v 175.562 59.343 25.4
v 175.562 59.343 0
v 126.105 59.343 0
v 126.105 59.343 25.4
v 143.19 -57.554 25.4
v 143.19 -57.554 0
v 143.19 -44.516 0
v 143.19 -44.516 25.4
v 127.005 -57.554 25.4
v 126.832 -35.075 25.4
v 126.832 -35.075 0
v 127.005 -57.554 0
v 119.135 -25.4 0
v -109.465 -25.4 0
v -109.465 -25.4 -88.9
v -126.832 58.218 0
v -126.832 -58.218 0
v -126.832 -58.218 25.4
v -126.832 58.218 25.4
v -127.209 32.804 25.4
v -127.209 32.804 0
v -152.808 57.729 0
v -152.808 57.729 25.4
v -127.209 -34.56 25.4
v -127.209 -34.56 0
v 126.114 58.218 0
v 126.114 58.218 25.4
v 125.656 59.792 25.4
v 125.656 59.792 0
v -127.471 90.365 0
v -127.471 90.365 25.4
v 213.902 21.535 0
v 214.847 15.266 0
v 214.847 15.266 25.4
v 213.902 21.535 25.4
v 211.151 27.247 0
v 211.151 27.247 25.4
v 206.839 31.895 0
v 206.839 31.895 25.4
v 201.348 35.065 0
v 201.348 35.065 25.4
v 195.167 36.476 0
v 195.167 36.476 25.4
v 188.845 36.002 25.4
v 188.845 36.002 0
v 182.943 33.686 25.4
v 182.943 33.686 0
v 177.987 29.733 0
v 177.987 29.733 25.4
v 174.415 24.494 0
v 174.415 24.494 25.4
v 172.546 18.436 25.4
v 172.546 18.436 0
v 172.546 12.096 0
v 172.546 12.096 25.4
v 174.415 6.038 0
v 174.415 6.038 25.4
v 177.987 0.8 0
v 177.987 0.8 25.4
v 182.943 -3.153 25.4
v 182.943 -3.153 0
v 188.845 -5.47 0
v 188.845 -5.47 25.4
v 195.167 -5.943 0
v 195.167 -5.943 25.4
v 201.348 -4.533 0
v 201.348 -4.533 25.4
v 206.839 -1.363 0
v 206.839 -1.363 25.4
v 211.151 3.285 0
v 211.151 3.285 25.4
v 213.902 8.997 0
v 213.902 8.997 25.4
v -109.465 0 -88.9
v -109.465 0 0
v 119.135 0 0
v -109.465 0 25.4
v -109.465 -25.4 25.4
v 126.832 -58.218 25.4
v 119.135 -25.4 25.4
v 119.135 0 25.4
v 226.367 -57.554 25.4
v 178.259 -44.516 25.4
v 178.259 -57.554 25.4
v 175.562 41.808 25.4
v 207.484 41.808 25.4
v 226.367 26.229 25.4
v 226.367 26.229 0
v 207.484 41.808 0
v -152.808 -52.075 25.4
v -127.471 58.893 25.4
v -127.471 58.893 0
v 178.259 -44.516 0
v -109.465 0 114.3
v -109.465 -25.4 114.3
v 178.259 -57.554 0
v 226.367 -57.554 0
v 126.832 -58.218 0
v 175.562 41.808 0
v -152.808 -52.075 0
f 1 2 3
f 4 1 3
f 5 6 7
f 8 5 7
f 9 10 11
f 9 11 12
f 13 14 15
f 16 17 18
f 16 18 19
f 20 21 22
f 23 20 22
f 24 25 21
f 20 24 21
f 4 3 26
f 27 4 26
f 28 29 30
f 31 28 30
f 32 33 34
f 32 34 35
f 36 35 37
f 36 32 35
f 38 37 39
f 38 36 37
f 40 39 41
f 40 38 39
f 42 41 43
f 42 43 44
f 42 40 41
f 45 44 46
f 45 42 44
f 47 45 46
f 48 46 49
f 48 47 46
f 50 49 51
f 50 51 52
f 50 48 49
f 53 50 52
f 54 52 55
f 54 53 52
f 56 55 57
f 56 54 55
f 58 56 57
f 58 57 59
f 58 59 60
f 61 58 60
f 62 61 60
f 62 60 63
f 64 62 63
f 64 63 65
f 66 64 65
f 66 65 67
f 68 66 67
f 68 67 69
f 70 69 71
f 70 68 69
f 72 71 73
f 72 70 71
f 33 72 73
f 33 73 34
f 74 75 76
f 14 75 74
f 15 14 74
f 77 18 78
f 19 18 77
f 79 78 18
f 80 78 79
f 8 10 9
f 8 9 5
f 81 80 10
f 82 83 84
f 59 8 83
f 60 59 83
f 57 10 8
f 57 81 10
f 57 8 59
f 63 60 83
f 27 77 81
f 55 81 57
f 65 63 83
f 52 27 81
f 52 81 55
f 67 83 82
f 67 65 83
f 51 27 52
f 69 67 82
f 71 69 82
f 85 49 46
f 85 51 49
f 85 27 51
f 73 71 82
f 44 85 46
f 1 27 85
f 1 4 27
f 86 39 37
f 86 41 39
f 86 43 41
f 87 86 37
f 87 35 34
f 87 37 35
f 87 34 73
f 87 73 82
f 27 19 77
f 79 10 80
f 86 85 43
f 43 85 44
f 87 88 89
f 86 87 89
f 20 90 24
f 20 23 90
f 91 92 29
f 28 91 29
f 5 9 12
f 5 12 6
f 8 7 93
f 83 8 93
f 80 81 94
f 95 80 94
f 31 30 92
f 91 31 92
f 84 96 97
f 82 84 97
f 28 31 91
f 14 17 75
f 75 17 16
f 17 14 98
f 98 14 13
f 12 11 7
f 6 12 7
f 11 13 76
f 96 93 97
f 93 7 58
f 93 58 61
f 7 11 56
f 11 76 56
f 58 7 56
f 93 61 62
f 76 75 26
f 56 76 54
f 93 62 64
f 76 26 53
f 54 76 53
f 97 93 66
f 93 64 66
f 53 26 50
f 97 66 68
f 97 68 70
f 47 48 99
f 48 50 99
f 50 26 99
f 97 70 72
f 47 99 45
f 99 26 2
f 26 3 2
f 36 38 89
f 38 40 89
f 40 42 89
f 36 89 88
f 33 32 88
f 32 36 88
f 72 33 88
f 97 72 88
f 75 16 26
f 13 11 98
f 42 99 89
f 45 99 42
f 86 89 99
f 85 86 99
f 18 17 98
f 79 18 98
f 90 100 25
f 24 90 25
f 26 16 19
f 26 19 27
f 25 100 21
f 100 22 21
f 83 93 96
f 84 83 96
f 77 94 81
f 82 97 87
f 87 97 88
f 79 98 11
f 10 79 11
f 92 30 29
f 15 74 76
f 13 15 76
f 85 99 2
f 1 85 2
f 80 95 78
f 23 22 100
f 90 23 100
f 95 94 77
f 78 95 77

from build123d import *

# Parameters (mm, degrees)
F0_W     = 253.6633908749
F0_H     = 116.4356470108
F5_DEPTH = 25.4
F8_DEPTH = 25.4
F1_R     = 21.2689966395
F9_DEPTH = 25.4


# Not quite as in the source:
# - a feature of the source that left no trace in its solid (it failed there, or was rolled back) is left out


with BuildPart() as f5:
    # F0 (on Top) → F5 (new body)
    with BuildSketch(Plane.XY):
        Rectangle(F0_W, F0_H)
    extrude(amount=F5_DEPTH)

    # F7 (on Front) → F8 (join)
    with BuildSketch(Plane.XZ):
        Polygon((-109.4650974564, 25.4), (-109.4650974564, 0), (-109.4650974564, -88.9), (119.1349025436, 0), (119.1349025436, 25.4), (-109.4650974564, 114.3), align=None)
    extrude(amount=F8_DEPTH)

    # F1 (on Top) → F9 (join)
    with BuildSketch(Plane.XY):
        Polygon((175.5617409945, 59.3426562846), (126.1054128408, 59.3426562846), (127.0046085119, -57.5541220605), (143.1903243065, -57.5541220605), (143.1903243065, -44.5156358182), (178.25935781, -44.5156358182), (178.25935781, -57.5541220605), (226.3668775558, -57.5541220605), (226.3668775558, -44.5156358182), (226.3668775558, -17.5394564867), (226.3668775558, 0), (226.3668775558, 26.2293902971), (207.4835598469, 41.8081395328), (175.5617409945, 41.8081395328), align=None)
        with Locations((193.577849129, 15.2662187056)):
            Circle(F1_R, mode=Mode.SUBTRACT)
    extrude(amount=F9_DEPTH)


with BuildPart() as f5b:
    # F3 (on Top) → F5, piece 2 (new body)
    with BuildSketch(Plane.XY):
        Polygon((-127.4706870317, 90.36526829), (-127.4706870317, 58.8930547237), (125.6558001041, 59.7922615707), align=None)
    extrude(amount=F5_DEPTH)


with BuildPart() as f5c:
    # F4 (on Top) → F5, piece 3 (new body)
    with BuildSketch(Plane.XY):
        Polygon((-152.8075635433, -52.0751588047), (-127.2091120481, -34.560430795), (-127.2091120481, 32.8039005399), (-152.8075635433, 57.7287077904), align=None)
    extrude(amount=F5_DEPTH)


solid = Compound([f5.part, f5b.part, f5c.part])
